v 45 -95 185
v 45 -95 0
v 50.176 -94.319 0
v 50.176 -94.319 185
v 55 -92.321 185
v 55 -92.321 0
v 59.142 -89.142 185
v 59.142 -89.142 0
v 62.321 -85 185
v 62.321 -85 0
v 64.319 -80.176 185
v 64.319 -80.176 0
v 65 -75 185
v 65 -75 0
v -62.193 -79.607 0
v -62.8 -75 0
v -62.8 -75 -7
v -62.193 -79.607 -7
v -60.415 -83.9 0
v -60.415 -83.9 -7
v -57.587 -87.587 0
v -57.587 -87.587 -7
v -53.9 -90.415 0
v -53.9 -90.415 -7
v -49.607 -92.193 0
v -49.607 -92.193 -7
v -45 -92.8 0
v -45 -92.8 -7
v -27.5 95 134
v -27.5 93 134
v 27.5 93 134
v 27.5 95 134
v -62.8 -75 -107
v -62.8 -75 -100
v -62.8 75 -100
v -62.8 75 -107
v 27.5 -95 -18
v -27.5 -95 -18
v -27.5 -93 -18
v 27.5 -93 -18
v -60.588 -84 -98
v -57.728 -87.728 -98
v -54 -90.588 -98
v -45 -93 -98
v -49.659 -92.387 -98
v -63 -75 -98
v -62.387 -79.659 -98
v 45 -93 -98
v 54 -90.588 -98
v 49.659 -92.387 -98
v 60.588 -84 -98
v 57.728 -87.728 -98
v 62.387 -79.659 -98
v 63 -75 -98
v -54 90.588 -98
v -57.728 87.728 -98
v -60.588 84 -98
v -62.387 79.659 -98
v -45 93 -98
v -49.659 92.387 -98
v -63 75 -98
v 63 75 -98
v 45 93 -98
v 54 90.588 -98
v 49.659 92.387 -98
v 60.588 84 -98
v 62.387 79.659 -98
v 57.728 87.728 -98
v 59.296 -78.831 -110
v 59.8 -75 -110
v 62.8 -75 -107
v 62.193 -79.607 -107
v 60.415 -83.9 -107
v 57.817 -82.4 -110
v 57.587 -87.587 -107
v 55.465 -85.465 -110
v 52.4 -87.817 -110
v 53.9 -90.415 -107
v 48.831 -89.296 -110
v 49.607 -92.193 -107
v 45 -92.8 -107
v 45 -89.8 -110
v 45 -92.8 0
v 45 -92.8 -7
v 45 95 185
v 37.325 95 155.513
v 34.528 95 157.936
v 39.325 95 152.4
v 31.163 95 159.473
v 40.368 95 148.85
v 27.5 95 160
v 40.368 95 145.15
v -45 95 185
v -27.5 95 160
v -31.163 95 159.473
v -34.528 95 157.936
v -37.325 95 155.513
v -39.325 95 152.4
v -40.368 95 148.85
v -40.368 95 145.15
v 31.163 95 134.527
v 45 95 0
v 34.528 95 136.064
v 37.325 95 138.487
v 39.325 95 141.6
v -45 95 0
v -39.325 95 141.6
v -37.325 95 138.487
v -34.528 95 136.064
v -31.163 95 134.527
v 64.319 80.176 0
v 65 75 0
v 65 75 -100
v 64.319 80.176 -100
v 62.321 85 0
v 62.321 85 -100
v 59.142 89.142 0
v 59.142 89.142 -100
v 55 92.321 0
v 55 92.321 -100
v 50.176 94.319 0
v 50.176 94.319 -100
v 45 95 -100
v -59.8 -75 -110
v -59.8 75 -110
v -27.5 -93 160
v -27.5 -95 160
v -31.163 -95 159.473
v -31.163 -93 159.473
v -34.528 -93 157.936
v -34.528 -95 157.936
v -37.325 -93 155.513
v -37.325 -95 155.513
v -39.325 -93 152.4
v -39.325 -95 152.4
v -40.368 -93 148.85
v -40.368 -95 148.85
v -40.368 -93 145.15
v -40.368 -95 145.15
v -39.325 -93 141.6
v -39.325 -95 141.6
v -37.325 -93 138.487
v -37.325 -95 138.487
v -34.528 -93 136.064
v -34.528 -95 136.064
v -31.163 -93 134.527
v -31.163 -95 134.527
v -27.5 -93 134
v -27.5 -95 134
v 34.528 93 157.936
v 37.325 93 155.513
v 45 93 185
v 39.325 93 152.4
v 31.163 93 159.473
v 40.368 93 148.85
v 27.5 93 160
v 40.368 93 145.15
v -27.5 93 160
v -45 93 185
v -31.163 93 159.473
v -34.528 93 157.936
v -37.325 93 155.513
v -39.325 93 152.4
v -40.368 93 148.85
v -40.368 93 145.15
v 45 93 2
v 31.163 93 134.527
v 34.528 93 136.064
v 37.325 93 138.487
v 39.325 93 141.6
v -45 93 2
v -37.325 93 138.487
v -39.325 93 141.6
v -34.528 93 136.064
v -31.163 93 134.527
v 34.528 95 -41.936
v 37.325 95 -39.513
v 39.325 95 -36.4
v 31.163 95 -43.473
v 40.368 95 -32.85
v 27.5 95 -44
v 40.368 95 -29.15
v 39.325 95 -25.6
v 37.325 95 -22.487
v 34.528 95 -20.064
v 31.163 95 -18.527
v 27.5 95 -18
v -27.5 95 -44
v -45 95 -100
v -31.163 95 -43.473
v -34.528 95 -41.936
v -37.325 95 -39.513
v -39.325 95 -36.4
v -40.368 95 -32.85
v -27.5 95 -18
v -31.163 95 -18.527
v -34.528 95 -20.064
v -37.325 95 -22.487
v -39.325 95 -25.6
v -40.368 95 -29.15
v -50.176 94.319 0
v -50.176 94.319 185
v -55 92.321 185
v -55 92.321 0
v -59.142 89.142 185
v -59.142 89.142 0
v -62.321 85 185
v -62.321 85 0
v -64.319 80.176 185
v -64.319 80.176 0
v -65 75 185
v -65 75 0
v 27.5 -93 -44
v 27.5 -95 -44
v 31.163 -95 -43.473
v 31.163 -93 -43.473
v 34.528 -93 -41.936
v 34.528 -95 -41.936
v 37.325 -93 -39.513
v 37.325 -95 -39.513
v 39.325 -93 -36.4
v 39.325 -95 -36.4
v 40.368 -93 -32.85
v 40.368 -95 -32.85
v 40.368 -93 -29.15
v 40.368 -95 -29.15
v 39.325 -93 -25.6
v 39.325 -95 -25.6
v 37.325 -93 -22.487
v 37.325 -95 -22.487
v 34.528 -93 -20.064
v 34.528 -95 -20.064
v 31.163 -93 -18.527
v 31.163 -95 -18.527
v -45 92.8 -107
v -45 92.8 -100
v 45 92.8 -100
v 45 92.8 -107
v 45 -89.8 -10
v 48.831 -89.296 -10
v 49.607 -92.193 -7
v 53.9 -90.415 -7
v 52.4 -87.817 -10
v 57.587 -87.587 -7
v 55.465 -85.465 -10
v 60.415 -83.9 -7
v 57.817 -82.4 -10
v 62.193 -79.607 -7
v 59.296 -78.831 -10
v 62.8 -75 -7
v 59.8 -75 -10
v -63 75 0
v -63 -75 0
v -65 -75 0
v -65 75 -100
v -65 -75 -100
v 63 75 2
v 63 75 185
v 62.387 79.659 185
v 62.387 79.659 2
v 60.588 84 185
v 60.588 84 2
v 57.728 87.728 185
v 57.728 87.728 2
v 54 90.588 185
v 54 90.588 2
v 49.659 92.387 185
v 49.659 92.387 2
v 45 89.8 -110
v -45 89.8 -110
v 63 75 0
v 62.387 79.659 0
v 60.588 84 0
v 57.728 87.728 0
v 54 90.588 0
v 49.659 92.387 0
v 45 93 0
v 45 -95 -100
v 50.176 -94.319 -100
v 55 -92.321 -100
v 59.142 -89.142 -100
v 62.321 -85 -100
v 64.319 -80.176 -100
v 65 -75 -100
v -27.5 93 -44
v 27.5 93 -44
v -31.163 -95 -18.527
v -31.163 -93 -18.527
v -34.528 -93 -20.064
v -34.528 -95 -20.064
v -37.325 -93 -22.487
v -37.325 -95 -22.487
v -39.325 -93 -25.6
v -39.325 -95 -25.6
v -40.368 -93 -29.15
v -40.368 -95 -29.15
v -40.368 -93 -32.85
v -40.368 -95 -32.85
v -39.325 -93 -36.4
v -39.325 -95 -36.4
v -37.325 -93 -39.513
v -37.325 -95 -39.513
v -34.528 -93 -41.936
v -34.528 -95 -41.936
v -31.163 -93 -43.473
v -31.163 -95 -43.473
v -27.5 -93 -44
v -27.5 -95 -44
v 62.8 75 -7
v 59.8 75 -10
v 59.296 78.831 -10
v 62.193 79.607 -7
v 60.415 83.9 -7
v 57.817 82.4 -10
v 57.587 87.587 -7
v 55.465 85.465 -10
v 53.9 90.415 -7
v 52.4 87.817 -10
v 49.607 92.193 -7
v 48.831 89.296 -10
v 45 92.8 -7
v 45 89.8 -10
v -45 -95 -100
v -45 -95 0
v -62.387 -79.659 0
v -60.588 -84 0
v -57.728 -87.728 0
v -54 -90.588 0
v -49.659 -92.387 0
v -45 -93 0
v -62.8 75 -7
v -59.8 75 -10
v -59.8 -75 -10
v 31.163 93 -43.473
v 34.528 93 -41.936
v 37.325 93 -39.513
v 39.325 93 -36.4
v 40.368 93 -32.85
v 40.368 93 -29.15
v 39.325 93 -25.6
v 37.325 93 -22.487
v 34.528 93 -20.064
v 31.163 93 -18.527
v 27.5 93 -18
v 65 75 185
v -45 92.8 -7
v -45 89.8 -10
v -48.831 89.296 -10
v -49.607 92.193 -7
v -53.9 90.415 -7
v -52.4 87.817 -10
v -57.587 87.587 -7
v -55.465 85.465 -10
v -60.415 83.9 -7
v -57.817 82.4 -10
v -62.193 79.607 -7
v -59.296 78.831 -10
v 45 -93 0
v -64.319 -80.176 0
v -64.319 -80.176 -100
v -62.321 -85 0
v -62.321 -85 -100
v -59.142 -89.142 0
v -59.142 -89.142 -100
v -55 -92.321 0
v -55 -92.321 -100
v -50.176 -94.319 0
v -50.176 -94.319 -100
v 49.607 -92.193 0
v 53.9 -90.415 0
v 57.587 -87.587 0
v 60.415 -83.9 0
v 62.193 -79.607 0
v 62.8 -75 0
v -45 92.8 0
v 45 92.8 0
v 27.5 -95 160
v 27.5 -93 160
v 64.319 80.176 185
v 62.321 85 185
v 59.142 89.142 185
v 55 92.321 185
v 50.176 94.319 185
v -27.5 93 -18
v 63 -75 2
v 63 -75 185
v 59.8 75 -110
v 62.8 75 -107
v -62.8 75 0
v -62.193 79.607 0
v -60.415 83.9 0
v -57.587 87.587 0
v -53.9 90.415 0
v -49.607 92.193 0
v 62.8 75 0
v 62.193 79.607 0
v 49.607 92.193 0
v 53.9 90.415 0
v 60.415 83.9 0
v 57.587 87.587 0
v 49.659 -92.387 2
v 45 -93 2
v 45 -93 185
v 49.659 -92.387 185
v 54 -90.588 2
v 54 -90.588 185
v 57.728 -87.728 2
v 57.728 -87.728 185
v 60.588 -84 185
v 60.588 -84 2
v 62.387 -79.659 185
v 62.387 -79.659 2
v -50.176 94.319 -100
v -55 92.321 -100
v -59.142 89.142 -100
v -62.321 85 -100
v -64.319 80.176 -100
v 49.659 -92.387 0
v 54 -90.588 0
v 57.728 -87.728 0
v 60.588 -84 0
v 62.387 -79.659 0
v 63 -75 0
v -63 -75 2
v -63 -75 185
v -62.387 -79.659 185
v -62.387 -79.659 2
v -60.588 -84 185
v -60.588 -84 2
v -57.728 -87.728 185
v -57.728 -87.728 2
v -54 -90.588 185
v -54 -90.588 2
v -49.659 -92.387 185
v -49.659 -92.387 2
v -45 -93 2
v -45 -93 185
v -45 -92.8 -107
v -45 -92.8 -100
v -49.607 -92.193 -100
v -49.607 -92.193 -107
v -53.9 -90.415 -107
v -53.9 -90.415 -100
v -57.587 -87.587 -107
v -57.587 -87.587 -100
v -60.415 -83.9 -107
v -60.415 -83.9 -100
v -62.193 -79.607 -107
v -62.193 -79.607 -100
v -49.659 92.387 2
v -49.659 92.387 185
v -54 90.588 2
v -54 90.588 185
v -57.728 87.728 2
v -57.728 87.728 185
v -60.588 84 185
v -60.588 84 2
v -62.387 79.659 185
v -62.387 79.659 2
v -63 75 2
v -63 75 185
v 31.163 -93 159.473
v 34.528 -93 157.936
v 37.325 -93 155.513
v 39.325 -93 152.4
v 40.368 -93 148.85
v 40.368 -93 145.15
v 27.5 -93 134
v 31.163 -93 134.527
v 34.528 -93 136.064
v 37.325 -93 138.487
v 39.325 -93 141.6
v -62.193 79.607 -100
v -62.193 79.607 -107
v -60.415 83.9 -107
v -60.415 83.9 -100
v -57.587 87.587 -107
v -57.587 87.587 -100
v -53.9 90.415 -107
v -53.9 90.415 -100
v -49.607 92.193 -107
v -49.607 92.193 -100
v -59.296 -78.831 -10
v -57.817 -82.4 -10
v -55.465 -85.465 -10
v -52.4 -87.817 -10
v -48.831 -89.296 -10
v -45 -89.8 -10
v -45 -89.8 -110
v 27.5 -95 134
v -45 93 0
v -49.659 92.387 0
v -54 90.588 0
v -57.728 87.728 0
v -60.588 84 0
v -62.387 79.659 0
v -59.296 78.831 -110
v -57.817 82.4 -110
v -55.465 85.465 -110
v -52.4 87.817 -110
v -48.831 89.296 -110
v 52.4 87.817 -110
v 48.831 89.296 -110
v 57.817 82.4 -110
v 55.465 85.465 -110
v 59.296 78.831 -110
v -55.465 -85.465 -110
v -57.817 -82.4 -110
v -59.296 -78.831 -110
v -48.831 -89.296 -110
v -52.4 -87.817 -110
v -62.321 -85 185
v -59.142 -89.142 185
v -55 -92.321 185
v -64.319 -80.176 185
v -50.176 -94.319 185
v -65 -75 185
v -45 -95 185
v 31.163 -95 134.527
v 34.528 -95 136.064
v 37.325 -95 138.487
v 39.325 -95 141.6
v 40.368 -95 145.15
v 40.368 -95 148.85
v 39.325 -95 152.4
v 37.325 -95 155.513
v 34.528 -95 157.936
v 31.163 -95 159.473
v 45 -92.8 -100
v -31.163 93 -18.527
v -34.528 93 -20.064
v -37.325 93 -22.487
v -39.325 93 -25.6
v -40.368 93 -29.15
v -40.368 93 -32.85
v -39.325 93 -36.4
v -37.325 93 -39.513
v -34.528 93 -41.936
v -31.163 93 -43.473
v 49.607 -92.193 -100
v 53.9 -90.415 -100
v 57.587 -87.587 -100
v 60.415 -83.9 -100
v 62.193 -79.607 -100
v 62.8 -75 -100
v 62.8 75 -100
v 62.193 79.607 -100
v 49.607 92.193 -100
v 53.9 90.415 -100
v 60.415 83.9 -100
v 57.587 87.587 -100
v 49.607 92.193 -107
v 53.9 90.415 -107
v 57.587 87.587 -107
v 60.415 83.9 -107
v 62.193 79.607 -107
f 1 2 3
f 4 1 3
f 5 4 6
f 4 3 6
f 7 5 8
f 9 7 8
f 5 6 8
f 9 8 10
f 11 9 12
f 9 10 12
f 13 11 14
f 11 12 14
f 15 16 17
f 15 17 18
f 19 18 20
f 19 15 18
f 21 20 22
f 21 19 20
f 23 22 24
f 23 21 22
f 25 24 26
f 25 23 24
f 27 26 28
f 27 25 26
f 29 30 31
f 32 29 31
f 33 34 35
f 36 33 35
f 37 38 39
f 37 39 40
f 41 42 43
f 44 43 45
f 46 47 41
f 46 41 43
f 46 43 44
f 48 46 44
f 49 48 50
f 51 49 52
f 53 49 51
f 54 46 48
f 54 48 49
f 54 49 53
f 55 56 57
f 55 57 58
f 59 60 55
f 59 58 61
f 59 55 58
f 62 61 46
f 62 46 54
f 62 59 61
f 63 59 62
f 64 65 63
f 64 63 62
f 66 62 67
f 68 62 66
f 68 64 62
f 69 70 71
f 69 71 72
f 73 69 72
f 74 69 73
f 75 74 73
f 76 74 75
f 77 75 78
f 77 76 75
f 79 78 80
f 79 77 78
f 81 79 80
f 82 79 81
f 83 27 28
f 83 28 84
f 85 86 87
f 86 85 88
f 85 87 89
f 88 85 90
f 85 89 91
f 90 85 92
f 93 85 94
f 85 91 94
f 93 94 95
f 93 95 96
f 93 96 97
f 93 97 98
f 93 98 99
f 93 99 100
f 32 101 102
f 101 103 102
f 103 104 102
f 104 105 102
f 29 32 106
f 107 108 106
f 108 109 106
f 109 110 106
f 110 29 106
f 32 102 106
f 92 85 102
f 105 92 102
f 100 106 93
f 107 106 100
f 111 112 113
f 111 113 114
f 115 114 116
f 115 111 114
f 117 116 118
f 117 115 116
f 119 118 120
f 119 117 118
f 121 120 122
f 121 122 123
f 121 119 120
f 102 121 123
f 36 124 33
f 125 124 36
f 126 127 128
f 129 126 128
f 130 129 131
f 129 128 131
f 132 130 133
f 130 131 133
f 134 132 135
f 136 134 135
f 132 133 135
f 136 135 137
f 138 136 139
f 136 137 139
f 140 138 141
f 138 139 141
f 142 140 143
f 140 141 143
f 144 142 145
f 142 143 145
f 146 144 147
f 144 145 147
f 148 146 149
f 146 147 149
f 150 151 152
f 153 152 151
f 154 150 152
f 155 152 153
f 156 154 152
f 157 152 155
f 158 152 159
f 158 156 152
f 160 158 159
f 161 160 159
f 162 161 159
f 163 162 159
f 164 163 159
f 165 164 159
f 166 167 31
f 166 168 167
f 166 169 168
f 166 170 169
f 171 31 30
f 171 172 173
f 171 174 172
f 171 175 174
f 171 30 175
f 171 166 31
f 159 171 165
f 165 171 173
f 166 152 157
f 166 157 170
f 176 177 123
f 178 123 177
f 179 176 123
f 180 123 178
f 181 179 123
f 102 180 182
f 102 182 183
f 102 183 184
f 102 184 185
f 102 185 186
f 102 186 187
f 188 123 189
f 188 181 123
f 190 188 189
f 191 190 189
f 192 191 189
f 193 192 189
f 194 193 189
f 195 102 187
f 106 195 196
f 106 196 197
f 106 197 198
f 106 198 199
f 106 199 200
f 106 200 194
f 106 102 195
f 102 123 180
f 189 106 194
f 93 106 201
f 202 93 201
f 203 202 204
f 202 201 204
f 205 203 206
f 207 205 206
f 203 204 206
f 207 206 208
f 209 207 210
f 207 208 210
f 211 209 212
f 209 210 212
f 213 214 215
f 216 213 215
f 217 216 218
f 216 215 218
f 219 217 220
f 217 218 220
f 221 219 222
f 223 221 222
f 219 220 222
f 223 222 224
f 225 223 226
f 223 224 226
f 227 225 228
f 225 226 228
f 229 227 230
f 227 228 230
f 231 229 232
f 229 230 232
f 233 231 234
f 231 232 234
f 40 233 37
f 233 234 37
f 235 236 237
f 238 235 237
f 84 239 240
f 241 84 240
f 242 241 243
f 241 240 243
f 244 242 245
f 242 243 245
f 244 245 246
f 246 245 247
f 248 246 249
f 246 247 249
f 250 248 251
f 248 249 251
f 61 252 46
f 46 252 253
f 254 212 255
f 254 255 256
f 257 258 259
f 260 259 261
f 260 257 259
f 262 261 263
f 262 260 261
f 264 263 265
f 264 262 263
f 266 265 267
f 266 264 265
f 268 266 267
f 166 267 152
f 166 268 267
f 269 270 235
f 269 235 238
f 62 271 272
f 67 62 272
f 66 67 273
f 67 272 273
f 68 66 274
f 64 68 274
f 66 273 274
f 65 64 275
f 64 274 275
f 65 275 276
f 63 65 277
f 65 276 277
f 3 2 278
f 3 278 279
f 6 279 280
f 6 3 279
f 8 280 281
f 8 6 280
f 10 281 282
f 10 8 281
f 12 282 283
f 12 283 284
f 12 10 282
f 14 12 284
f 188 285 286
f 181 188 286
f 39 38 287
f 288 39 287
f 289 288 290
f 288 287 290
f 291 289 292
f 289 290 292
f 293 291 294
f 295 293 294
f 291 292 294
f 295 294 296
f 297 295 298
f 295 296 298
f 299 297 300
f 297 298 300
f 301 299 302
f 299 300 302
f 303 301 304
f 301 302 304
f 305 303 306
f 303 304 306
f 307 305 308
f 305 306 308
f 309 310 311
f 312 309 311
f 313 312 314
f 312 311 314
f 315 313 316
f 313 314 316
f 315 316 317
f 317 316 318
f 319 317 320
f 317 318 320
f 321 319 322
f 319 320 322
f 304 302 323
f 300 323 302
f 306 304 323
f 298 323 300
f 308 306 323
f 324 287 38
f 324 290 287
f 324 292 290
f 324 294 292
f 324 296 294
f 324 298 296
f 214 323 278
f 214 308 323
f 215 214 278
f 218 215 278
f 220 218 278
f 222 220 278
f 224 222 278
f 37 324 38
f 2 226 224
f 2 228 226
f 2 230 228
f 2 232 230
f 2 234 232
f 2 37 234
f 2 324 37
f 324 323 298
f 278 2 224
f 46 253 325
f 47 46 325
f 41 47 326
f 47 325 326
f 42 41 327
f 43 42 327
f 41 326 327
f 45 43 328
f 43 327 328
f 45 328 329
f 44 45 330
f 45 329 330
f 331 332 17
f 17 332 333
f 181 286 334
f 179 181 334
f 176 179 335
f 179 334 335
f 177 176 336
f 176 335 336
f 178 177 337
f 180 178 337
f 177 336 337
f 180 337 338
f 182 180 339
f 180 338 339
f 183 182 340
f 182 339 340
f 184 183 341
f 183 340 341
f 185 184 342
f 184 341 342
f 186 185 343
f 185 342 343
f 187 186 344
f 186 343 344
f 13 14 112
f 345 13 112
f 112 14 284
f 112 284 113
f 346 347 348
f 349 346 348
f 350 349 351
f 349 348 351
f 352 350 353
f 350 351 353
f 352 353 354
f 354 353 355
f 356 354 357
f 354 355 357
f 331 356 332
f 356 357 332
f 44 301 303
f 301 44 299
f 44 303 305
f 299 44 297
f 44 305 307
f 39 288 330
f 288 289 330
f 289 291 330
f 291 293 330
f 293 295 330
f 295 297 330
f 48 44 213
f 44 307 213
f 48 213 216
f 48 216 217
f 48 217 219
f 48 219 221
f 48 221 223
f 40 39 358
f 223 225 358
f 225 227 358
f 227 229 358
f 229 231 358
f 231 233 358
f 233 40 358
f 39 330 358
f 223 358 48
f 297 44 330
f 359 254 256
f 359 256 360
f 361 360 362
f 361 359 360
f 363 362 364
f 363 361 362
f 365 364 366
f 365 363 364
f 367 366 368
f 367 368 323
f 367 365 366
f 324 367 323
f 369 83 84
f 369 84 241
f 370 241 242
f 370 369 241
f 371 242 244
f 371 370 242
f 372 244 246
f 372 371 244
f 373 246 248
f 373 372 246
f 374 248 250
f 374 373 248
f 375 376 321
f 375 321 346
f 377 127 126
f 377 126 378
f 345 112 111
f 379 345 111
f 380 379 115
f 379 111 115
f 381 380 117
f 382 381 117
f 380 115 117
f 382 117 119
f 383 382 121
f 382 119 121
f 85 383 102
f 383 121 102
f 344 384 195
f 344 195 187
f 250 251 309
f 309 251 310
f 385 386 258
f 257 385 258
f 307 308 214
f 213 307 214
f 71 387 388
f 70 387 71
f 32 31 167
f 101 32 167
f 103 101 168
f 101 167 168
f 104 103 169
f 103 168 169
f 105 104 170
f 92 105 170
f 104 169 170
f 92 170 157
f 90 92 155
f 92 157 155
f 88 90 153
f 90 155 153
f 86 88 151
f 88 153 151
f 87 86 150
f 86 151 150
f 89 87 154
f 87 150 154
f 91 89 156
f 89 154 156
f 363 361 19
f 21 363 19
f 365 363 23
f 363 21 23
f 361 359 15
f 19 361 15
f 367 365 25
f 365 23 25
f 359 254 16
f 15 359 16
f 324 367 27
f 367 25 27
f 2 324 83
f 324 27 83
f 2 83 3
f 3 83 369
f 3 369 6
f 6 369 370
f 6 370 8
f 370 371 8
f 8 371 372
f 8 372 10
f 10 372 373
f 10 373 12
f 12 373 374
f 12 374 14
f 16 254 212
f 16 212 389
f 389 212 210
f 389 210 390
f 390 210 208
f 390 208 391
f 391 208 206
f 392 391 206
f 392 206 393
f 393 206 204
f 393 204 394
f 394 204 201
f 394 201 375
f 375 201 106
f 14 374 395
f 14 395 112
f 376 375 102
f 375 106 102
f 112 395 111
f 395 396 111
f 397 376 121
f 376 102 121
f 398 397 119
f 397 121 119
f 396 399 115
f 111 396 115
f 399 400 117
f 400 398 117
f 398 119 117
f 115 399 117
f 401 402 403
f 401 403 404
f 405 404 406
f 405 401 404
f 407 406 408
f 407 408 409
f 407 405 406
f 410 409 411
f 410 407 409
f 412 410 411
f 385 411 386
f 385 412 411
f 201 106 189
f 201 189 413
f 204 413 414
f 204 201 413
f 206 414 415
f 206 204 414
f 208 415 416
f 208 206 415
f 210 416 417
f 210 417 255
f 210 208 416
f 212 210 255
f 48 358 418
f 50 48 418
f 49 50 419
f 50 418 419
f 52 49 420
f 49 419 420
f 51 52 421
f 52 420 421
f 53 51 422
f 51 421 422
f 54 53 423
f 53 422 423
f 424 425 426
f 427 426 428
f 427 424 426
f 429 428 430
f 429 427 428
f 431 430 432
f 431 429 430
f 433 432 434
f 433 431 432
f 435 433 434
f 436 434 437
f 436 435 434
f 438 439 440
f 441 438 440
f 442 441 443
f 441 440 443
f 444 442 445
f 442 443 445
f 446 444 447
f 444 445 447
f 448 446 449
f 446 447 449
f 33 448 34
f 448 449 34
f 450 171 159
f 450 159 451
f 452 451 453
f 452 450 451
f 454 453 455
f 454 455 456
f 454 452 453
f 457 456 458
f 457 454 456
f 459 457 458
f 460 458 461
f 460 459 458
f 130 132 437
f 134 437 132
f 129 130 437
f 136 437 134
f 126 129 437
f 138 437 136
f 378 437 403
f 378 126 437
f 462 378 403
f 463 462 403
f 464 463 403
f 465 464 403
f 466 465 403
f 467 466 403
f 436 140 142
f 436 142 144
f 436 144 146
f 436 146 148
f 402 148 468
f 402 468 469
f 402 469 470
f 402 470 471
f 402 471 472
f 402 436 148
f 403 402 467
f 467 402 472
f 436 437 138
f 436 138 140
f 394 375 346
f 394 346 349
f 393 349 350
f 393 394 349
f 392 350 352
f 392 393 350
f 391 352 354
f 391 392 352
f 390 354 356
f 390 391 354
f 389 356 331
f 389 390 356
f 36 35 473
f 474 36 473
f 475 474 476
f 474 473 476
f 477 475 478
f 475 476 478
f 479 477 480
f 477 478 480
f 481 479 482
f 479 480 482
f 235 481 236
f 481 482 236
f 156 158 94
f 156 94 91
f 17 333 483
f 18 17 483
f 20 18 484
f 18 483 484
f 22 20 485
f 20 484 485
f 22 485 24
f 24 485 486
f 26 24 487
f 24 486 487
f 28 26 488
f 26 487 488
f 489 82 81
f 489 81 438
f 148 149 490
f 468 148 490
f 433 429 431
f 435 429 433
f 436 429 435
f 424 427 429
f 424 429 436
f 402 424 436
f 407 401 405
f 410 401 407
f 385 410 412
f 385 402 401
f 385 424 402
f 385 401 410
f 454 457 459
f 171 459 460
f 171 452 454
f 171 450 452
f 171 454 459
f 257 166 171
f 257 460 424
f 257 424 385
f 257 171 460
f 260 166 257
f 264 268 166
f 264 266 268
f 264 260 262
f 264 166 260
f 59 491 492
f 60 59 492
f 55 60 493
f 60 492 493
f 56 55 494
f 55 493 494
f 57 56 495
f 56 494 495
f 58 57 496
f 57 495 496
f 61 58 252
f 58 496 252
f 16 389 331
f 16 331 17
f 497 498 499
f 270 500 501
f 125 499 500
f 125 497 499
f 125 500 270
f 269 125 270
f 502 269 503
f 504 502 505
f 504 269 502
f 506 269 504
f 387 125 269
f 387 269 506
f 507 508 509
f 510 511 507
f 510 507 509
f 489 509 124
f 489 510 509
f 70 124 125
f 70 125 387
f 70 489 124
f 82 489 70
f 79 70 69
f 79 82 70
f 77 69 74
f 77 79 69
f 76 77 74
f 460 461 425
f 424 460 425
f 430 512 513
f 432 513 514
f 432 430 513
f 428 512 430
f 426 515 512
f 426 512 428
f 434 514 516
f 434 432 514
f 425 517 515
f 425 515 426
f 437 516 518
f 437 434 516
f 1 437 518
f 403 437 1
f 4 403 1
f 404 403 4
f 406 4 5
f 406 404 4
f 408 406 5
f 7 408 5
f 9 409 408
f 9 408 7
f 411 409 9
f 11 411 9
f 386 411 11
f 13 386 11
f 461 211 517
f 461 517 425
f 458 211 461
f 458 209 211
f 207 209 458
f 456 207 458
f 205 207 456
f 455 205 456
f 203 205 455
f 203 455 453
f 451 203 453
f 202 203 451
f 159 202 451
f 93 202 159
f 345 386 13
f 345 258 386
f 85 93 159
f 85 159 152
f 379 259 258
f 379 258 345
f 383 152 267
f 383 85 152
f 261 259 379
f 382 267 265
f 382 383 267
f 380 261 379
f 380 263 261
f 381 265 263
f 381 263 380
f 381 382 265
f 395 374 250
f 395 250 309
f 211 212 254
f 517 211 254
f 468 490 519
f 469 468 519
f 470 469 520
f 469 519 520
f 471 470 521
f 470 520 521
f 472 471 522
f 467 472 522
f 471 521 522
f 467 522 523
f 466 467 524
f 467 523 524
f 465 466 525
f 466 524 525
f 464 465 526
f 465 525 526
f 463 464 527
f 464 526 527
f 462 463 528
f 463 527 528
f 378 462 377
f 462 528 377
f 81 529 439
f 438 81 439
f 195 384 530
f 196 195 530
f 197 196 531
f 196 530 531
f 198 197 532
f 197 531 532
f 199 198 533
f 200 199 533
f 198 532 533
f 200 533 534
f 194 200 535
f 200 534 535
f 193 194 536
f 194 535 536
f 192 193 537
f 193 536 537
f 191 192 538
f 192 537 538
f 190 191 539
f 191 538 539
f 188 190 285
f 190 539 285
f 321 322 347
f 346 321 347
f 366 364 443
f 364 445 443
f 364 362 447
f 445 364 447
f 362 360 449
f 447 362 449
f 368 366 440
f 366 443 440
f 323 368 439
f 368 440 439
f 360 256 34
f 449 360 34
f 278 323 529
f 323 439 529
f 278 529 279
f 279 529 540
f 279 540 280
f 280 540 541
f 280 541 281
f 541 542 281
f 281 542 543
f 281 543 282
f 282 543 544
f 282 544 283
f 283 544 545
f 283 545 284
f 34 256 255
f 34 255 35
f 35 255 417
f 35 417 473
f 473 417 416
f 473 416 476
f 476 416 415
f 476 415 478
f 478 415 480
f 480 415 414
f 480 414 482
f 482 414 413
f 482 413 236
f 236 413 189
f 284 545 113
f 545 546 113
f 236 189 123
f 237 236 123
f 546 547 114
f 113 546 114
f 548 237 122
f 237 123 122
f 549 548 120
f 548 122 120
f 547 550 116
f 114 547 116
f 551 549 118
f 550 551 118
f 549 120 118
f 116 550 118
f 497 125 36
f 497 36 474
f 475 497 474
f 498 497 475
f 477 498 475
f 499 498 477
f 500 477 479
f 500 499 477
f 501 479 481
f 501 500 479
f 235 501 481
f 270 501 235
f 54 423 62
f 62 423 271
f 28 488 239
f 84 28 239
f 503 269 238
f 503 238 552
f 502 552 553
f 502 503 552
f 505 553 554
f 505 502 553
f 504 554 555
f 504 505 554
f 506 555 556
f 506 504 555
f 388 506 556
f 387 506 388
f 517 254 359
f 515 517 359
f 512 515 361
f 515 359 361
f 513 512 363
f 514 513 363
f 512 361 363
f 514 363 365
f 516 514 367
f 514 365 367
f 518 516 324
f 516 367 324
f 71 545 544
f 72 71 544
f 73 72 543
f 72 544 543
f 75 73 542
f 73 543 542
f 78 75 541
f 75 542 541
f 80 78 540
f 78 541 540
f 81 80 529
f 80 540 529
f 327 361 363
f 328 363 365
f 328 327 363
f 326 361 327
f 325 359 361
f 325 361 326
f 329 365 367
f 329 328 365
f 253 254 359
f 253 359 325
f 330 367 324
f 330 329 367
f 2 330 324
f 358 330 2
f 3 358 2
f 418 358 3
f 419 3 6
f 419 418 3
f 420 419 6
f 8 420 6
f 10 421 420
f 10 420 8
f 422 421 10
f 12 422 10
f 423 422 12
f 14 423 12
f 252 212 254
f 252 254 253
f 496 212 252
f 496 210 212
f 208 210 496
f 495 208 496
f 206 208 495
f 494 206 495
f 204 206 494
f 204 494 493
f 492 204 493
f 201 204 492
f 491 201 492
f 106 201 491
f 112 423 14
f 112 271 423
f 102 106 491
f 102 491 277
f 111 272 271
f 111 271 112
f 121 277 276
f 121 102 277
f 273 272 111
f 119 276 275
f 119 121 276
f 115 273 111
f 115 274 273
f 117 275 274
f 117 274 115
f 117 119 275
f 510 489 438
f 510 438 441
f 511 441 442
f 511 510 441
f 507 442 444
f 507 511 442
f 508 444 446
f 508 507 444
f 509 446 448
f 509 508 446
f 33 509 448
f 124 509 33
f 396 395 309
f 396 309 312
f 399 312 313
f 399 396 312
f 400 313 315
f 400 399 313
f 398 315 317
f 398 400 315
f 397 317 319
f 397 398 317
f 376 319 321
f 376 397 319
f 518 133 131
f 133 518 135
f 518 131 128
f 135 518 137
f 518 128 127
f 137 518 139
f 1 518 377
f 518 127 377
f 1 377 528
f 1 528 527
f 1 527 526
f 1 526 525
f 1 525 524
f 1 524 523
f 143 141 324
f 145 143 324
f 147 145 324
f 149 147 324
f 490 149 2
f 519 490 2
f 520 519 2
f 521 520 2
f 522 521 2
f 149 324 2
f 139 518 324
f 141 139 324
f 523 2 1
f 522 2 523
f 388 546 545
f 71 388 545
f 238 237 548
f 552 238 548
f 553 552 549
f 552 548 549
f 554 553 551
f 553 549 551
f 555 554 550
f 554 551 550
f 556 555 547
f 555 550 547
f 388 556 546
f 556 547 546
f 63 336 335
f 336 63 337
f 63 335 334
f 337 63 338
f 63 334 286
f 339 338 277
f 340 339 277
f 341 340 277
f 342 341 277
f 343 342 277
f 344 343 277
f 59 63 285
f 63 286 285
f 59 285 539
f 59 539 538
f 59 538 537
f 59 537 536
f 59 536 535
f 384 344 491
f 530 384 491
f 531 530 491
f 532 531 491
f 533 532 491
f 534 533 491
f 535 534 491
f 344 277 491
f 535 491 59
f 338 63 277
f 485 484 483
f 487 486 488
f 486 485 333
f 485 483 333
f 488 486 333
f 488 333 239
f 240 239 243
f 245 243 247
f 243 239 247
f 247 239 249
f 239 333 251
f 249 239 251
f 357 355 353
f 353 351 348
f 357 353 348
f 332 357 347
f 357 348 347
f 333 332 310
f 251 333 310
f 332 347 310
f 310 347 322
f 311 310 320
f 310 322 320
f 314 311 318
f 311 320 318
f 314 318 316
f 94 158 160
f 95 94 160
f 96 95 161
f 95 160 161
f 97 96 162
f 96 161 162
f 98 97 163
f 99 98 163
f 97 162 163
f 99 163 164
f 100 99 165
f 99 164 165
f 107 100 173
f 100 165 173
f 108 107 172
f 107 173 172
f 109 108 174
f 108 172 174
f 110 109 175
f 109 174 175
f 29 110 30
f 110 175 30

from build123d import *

# Parameters (mm, degrees)
F2_DEPTH  = 185
F3_T      = -2
F4_DEPTH  = 10
F5_DEPTH  = 100
F6_T      = -2
F8_DEPTH  = 10
F9_SIZE   = 3
F9_2_SIZE = 3
F10_W     = 55
F10_H     = 26
F11_DEPTH = 190.001


with BuildPart() as f2:
    # F1 (on Top) → F2 (new body)
    with BuildSketch(Plane.XY):
        with BuildLine():
            ThreePointArc((65, 75), (59.1421356237, 89.1421356237), (45, 95))
            Line((45, 95), (-45, 95))
            ThreePointArc((-45, 95), (-59.1421356237, 89.1421356237), (-65, 75))
            Line((-65, 75), (-65, -75))
            ThreePointArc((-65, -75), (-59.1421356237, -89.1421356237), (-45, -95))
            Line((-45, -95), (45, -95))
            ThreePointArc((45, -95), (59.1421356237, -89.1421356237), (65, -75))
            Line((65, -75), (65, 75))
        make_face()
        with BuildLine():
            Line((-62.8, -75), (-62.8, 75))
            ThreePointArc((-62.8, 75), (-57.5865007051, 87.5865007051), (-45, 92.8))
            Line((-45, 92.8), (45, 92.8))
            ThreePointArc((45, 92.8), (57.5865007051, 87.5865007051), (62.8, 75))
            Line((62.8, 75), (62.8, -75))
            ThreePointArc((62.8, -75), (57.5865007051, -87.5865007051), (45, -92.8))
            Line((45, -92.8), (-45, -92.8))
            ThreePointArc((-45, -92.8), (-57.5865007051, -87.5865007051), (-62.8, -75))
        make_face(mode=Mode.SUBTRACT)
        with BuildLine():
            ThreePointArc((-45, 92.8), (-57.5865007051, 87.5865007051), (-62.8, 75))
            Line((-62.8, 75), (-62.8, -75))
            ThreePointArc((-62.8, -75), (-57.5865007051, -87.5865007051), (-45, -92.8))
            Line((-45, -92.8), (45, -92.8))
            ThreePointArc((45, -92.8), (57.5865007051, -87.5865007051), (62.8, -75))
            Line((62.8, -75), (62.8, 75))
            ThreePointArc((62.8, 75), (57.5865007051, 87.5865007051), (45, 92.8))
            Line((45, 92.8), (-45, 92.8))
        make_face()
    extrude(amount=F2_DEPTH)

    # F3
    f3_openings = [f2.faces().sort_by_distance(p)[0] for p in [
        (0, 0, 185),
    ]]
    offset(amount=F3_T, openings=f3_openings)

    # F1 (on Top) → F4 (join)
    with BuildSketch(Plane.XY):
        with BuildLine():
            ThreePointArc((-45, 92.8), (-57.5865007051, 87.5865007051), (-62.8, 75))
            Line((-62.8, 75), (-62.8, -75))
            ThreePointArc((-62.8, -75), (-57.5865007051, -87.5865007051), (-45, -92.8))
            Line((-45, -92.8), (45, -92.8))
            ThreePointArc((45, -92.8), (57.5865007051, -87.5865007051), (62.8, -75))
            Line((62.8, -75), (62.8, 75))
            ThreePointArc((62.8, 75), (57.5865007051, 87.5865007051), (45, 92.8))
            Line((45, 92.8), (-45, 92.8))
        make_face()
    extrude(amount=-F4_DEPTH)

    # F9#2
    f9_2_edges = [f2.edges().sort_by_distance(p)[0] for p in [
        (-57.586501, 87.586501, -10),
        (-62.8, 0, -10),
        (-57.586501, -87.586501, -10),
        (0, -92.8, -10),
        (57.586501, -87.586501, -10),
        (62.8, 0, -10),
        (57.586501, 87.586501, -10),
        (0, 92.8, -10),
    ]]
    chamfer(f9_2_edges, length=F9_2_SIZE)


with BuildPart() as f5:
    # F1 (on Top) → F5 (new body)
    with BuildSketch(Plane.XY):
        with BuildLine():
            ThreePointArc((65, 75), (59.1421356237, 89.1421356237), (45, 95))
            Line((45, 95), (-45, 95))
            ThreePointArc((-45, 95), (-59.1421356237, 89.1421356237), (-65, 75))
            Line((-65, 75), (-65, -75))
            ThreePointArc((-65, -75), (-59.1421356237, -89.1421356237), (-45, -95))
            Line((-45, -95), (45, -95))
            ThreePointArc((45, -95), (59.1421356237, -89.1421356237), (65, -75))
            Line((65, -75), (65, 75))
        make_face()
        with BuildLine():
            Line((-62.8, -75), (-62.8, 75))
            ThreePointArc((-62.8, 75), (-57.5865007051, 87.5865007051), (-45, 92.8))
            Line((-45, 92.8), (45, 92.8))
            ThreePointArc((45, 92.8), (57.5865007051, 87.5865007051), (62.8, 75))
            Line((62.8, 75), (62.8, -75))
            ThreePointArc((62.8, -75), (57.5865007051, -87.5865007051), (45, -92.8))
            Line((45, -92.8), (-45, -92.8))
            ThreePointArc((-45, -92.8), (-57.5865007051, -87.5865007051), (-62.8, -75))
        make_face(mode=Mode.SUBTRACT)
        with BuildLine():
            ThreePointArc((-45, 92.8), (-57.5865007051, 87.5865007051), (-62.8, 75))
            Line((-62.8, 75), (-62.8, -75))
            ThreePointArc((-62.8, -75), (-57.5865007051, -87.5865007051), (-45, -92.8))
            Line((-45, -92.8), (45, -92.8))
            ThreePointArc((45, -92.8), (57.5865007051, -87.5865007051), (62.8, -75))
            Line((62.8, -75), (62.8, 75))
            ThreePointArc((62.8, 75), (57.5865007051, 87.5865007051), (45, 92.8))
            Line((45, 92.8), (-45, 92.8))
        make_face()
    extrude(amount=-F5_DEPTH)

    # F6
    f6_openings = [f5.faces().sort_by_distance(p)[0] for p in [
        (0, 0, 0),
    ]]
    offset(amount=F6_T, openings=f6_openings)

    # F7 (on face) → F8 (join)
    with BuildSketch(Plane(origin=(0, 0, -100), x_dir=(1, 0, 0), z_dir=(0, 0, -1))):
        with BuildLine():
            Line((62.8, -75), (62.8, 75))
            ThreePointArc((62.8, 75), (57.5865007051, 87.5865007051), (45, 92.8))
            Line((45, 92.8), (-45, 92.8))
            ThreePointArc((-45, 92.8), (-57.5865007051, 87.5865007051), (-62.8, 75))
            Line((-62.8, 75), (-62.8, -75))
            ThreePointArc((-62.8, -75), (-57.5865007051, -87.5865007051), (-45, -92.8))
            Line((-45, -92.8), (45, -92.8))
            ThreePointArc((45, -92.8), (57.5865007051, -87.5865007051), (62.8, -75))
        make_face()
    extrude(amount=F8_DEPTH)

    # F9
    f9_edges = [f5.edges().sort_by_distance(p)[0] for p in [
        (62.8, 0, -110),
        (57.586501, -87.586501, -110),
        (0, -92.8, -110),
        (-57.586501, -87.586501, -110),
        (-62.8, 0, -110),
        (-57.586501, 87.586501, -110),
        (0, 92.8, -110),
        (57.586501, 87.586501, -110),
    ]]
    chamfer(f9_edges, length=F9_SIZE)


with BuildPart() as f11_tool:
    # F10 (on face) → F11 (new body, through all)
    with BuildSketch(Plane.XZ.offset(95)):
        with Locations((0, 147)):
            Rectangle(F10_W, F10_H)
        with BuildLine():
            ThreePointArc((27.5, 134), (40.5, 147), (27.5, 160))
            Line((27.5, 160), (27.5, 134))
        make_face()
        with BuildLine():
            Line((-27.5, 134), (-27.5, 160))
            ThreePointArc((-27.5, 160), (-40.5, 147), (-27.5, 134))
        make_face()
        with Locations((0, -31)):
            Rectangle(F10_W, F10_H)
        with BuildLine():
            ThreePointArc((27.5, -44), (40.5, -31), (27.5, -18))
            Line((27.5, -18), (27.5, -44))
        make_face()
        with BuildLine():
            Line((-27.5, -44), (-27.5, -18))
            ThreePointArc((-27.5, -18), (-40.5, -31), (-27.5, -44))
        make_face()
    extrude(amount=-F11_DEPTH)


with BuildPart() as f2_1:
    add(f2.part)

    # F11: cut by f11_tool
    add(f11_tool.part, mode=Mode.SUBTRACT)


with BuildPart() as f5_1:
    add(f5.part)

    # F11: cut by f11_tool
    add(f11_tool.part, mode=Mode.SUBTRACT)


solid = Compound([f2_1.part, f5_1.part])
